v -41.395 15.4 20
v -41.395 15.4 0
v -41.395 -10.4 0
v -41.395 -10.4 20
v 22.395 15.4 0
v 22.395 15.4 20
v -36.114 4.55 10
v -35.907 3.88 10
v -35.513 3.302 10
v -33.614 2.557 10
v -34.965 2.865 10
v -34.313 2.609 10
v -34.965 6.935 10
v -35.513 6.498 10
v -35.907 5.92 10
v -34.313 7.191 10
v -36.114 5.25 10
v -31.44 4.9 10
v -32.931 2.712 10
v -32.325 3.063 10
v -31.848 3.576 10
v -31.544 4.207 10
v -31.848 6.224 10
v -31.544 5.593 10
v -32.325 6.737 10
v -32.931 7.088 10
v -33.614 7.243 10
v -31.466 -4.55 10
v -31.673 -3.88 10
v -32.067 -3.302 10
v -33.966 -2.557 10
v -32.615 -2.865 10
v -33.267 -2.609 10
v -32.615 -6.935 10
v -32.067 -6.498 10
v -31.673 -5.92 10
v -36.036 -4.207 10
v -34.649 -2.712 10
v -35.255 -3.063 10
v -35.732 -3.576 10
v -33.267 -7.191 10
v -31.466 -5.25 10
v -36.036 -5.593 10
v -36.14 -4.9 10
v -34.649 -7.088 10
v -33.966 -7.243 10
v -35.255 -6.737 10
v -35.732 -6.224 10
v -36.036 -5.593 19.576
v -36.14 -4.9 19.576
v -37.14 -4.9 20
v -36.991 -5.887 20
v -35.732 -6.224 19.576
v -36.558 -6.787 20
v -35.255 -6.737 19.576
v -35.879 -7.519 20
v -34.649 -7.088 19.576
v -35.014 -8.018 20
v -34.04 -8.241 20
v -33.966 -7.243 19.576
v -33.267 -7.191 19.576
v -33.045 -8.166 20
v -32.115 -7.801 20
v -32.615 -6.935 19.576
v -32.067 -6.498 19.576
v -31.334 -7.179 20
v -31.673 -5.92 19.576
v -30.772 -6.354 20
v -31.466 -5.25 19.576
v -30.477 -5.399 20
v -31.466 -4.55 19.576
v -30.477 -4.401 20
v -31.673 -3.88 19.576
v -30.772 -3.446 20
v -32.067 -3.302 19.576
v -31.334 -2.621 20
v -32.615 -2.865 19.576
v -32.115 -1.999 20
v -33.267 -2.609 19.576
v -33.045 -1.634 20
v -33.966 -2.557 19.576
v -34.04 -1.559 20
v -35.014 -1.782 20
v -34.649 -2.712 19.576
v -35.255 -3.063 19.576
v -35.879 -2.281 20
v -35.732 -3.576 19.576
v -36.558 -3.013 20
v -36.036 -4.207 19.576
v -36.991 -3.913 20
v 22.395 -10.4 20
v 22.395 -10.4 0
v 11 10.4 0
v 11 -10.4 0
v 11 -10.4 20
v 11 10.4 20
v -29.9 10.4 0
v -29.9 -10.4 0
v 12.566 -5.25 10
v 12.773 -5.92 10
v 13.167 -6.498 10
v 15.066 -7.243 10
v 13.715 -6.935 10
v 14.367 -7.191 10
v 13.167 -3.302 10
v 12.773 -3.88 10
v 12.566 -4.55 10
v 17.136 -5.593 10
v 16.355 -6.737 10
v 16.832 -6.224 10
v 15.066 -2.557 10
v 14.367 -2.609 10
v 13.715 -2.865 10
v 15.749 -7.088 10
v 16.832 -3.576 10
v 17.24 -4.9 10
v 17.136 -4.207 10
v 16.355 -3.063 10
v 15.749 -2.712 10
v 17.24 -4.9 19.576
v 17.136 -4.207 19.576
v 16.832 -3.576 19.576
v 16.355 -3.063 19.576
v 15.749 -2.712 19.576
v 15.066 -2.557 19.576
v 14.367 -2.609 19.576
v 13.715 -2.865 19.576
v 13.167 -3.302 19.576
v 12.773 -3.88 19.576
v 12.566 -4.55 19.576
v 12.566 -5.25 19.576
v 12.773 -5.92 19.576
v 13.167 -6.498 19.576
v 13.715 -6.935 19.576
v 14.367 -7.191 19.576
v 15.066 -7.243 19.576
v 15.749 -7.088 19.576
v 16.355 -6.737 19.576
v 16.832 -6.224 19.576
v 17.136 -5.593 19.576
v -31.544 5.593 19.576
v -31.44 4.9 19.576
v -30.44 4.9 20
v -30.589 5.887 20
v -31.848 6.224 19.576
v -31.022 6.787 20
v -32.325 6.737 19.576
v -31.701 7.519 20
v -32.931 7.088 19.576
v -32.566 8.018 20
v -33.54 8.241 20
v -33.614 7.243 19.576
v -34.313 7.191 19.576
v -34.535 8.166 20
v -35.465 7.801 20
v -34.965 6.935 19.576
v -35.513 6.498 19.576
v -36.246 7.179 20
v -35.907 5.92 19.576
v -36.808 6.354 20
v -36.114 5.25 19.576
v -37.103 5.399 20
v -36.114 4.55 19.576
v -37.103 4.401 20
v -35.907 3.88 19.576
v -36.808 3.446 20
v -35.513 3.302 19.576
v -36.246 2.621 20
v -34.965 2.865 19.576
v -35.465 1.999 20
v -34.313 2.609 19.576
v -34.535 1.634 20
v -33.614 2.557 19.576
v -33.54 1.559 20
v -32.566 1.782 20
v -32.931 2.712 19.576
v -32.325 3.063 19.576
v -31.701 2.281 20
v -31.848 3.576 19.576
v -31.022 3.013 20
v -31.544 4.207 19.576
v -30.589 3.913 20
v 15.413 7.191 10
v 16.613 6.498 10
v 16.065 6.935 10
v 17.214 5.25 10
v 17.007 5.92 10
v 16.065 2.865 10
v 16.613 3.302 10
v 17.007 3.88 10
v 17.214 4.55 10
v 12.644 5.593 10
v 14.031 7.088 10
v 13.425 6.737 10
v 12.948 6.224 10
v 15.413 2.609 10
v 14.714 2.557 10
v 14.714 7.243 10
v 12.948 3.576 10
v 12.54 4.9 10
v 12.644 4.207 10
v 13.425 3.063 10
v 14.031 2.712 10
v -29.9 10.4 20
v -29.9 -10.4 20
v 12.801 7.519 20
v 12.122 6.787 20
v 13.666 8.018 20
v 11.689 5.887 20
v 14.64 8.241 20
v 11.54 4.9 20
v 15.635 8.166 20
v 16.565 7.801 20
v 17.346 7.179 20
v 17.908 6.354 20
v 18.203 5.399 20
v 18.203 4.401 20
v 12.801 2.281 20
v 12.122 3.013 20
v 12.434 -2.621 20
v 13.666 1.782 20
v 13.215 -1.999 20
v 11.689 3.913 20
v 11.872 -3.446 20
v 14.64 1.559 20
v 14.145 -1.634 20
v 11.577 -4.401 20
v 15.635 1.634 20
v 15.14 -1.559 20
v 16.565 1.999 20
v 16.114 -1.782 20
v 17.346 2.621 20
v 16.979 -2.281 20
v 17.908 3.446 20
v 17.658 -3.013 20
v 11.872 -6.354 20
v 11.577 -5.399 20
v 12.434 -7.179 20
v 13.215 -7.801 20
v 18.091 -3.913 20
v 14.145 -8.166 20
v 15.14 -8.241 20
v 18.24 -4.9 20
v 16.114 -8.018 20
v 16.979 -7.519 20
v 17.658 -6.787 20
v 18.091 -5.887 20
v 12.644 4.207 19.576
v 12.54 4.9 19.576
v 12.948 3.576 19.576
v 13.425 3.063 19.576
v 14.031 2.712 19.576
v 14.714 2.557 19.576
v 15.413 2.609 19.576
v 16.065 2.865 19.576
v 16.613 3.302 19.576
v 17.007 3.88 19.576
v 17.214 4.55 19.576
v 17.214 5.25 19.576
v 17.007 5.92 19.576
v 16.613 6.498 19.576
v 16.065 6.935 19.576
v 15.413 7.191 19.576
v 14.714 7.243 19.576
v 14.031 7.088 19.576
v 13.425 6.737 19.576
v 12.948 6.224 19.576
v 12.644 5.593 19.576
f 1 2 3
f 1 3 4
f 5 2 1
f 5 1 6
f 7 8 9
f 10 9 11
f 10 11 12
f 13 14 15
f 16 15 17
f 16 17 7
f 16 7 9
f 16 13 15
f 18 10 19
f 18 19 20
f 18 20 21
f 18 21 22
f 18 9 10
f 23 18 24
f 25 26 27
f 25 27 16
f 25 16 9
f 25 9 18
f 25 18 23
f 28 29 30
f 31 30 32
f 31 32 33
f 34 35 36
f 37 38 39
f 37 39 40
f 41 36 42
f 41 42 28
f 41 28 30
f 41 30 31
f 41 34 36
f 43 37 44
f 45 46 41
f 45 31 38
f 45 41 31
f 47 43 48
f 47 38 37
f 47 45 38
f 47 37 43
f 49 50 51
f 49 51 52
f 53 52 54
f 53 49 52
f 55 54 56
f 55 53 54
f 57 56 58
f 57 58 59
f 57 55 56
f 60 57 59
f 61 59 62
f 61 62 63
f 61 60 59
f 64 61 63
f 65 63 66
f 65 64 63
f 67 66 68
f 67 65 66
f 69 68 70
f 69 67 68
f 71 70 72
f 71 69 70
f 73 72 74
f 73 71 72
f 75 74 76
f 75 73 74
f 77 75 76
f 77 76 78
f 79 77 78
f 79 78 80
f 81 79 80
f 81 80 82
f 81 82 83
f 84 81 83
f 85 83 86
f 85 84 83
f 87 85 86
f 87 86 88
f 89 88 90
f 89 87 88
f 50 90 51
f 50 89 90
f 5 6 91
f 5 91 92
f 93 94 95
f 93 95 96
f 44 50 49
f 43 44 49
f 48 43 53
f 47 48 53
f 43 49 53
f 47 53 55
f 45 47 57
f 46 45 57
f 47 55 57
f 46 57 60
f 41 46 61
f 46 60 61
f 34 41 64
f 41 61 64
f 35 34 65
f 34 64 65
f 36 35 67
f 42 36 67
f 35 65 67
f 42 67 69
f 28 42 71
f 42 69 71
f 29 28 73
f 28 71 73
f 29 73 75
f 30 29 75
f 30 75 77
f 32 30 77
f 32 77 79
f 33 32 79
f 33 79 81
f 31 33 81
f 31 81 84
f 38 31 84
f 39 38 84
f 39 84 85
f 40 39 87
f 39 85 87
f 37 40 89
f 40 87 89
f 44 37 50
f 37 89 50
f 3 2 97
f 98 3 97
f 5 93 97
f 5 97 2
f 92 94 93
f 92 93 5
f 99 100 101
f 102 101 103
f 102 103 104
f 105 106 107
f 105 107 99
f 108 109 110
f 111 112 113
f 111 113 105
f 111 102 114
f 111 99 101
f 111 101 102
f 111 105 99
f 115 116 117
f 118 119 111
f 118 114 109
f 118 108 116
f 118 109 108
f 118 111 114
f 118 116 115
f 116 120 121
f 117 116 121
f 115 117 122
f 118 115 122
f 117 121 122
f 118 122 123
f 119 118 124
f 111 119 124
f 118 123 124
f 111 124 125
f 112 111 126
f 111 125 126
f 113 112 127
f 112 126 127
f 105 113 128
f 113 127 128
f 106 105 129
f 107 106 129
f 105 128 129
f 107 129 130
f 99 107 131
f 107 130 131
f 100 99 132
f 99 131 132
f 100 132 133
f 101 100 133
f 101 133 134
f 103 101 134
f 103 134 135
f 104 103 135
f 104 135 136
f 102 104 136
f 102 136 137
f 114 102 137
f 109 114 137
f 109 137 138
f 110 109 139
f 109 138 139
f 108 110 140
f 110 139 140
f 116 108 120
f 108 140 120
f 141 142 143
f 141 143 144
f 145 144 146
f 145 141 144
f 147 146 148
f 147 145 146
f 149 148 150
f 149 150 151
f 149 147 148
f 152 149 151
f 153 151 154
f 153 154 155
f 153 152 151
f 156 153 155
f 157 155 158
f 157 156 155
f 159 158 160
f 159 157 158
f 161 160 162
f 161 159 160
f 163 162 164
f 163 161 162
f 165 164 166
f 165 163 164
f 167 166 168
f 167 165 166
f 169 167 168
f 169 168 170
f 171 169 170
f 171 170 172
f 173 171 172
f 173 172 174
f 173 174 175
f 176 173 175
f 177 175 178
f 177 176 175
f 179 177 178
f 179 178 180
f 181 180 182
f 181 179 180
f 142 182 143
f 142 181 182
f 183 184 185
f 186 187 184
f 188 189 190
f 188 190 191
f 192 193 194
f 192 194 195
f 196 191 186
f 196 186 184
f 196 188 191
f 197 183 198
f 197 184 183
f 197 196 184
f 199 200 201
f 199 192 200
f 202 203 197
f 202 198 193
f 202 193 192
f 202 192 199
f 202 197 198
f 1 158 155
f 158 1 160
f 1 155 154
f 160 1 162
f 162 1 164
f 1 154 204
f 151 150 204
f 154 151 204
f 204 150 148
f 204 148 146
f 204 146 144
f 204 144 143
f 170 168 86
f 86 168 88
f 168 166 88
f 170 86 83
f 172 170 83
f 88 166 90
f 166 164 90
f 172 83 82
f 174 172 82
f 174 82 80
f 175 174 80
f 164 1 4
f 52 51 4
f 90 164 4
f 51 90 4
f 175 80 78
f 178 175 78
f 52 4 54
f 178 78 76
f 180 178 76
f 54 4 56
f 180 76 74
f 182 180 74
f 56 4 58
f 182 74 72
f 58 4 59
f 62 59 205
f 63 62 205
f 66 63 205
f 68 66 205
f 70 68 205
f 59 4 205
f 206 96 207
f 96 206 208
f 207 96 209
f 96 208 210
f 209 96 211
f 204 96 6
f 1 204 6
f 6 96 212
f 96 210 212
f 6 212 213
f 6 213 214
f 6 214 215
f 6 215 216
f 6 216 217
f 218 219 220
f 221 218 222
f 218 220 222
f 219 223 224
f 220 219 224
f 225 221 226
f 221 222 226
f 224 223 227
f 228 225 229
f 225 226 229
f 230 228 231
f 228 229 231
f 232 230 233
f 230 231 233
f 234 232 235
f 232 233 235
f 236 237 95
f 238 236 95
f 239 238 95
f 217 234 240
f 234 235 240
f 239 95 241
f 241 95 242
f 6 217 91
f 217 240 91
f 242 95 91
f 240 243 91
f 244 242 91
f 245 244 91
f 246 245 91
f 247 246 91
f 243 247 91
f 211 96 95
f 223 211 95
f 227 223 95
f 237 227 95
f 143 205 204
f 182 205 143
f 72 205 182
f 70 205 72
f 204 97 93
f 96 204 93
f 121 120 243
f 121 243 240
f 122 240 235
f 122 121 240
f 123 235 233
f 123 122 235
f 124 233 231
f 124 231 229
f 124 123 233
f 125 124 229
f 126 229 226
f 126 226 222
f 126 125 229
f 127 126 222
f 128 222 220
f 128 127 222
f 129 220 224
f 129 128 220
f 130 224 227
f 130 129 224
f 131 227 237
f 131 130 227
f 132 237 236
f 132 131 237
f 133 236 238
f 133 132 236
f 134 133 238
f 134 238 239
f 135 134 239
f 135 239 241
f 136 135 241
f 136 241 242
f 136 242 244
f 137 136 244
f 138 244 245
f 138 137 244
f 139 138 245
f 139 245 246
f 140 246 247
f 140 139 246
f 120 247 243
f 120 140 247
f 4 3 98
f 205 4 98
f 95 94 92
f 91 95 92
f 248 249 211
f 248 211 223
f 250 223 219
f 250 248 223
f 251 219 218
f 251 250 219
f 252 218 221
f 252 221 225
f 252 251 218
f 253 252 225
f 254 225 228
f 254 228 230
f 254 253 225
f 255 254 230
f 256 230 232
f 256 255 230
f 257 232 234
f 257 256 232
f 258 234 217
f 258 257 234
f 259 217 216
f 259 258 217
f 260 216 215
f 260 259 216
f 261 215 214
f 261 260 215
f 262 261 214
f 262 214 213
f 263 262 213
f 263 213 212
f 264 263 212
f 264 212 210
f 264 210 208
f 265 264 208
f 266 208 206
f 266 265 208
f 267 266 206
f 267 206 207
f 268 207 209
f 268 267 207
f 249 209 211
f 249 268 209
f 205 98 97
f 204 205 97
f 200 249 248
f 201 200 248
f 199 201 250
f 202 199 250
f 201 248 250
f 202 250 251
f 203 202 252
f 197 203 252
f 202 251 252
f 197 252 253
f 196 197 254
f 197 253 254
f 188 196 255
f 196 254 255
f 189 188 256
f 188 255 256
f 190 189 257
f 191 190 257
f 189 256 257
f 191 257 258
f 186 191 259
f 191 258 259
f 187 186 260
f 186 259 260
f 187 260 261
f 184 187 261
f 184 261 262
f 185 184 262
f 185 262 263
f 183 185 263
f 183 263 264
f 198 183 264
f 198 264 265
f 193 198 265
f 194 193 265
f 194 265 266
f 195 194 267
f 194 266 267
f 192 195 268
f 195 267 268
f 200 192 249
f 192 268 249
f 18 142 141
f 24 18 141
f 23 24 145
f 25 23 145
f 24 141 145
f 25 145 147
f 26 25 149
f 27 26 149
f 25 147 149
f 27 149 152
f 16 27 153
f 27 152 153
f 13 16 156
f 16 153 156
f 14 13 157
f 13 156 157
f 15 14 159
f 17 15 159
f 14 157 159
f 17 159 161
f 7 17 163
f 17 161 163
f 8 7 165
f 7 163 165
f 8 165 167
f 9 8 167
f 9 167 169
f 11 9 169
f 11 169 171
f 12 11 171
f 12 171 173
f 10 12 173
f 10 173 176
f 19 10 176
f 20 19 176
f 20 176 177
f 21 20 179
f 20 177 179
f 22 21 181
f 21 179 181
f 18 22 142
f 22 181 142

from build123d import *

# Parameters (mm, degrees)
SKETCH1_W           = 18.495
SKETCH1_H           = 20.8
SKETCH1_W_2         = 10
SKETCH1_W_3         = 37.395
BOSS_EXTRUDE1_DEPTH = 20
SKETCH6_W           = 106.79
SKETCH6_H           = 20
BOSS_EXTRUDE4_DEPTH = 5
SKETCH9_R           = 2.35
CUT_EXTRUDE1_DEPTH  = 10
SKETCH10_W          = 20
SKETCH10_H          = 25.8
CUT_EXTRUDE2_DEPTH  = 17
SKETCH11_W          = 20
SKETCH11_H          = 25.8
CUT_EXTRUDE3_DEPTH  = 26
CHAMFER1_SIZE       = 1
CHAMFER1_SIZE2      = 0.424474816


with BuildPart() as part:
    # Sketch1 → Boss-Extrude1 (new body)
    with BuildSketch(Plane.XY):
        with Locations((-39.1475, 0)):
            Rectangle(SKETCH1_W, SKETCH1_H)
        with Locations((-53.395, 0)):
            Rectangle(SKETCH1_W_2, SKETCH1_H)
        with Locations((29.6975, 0)):
            Rectangle(SKETCH1_W_3, SKETCH1_H)
    extrude(amount=BOSS_EXTRUDE1_DEPTH)

    # Sketch6 → Boss-Extrude4 (add)
    with BuildSketch(Plane(origin=(0, 10.4, 0), x_dir=(1, 0, 0), z_dir=(0, 1, 0))):
        with Locations((-5, -10)):
            Rectangle(SKETCH6_W, SKETCH6_H)
    extrude(amount=BOSS_EXTRUDE4_DEPTH)

    # Sketch9 → Cut-Extrude1 (cut)
    with BuildSketch(Plane.XY.offset(20)):
        with Locations((14.89, -4.9)):
            Circle(SKETCH9_R)
        with Locations(Location((14.89, 4.9, 0), (0, 0, 180))):
            Circle(SKETCH9_R)
        with Locations(Location((-33.79, -4.9, 0), (0, 0, 180))):
            Circle(SKETCH9_R)
        with Locations((-33.79, 4.9)):
            Circle(SKETCH9_R)
    extrude(amount=-CUT_EXTRUDE1_DEPTH, mode=Mode.SUBTRACT)

    # Sketch10 → Cut-Extrude2 (cut)
    with BuildSketch(Plane.ZY.offset(58.395)):
        with Locations((10, 2.5)):
            Rectangle(SKETCH10_W, SKETCH10_H)
    extrude(amount=-CUT_EXTRUDE2_DEPTH, mode=Mode.SUBTRACT)

    # Sketch11 → Cut-Extrude3 (cut)
    with BuildSketch(Plane(origin=(48.395, 0, 0), x_dir=(0, 0, -1), z_dir=(1, 0, 0))):
        with Locations((-10, 2.5)):
            Rectangle(SKETCH11_W, SKETCH11_H)
    extrude(amount=-CUT_EXTRUDE3_DEPTH, mode=Mode.SUBTRACT)

    # Chamfer1
    chamfer1_edges = [part.edges().sort_by_distance(p)[0] for p in [
        (17.24, 4.9, 20),
        (-31.44, -4.9, 20),
        (-36.14, 4.9, 20),
        (12.54, -4.9, 20),
    ]]
    chamfer1_side = [part.faces().sort_by_distance(p)[0] for p in [
        (-35.6475, -9.711900872, 20),
    ]]
    chamfer(chamfer1_edges, length=CHAMFER1_SIZE, length2=CHAMFER1_SIZE2, reference=chamfer1_side[0])


solid = part.part
